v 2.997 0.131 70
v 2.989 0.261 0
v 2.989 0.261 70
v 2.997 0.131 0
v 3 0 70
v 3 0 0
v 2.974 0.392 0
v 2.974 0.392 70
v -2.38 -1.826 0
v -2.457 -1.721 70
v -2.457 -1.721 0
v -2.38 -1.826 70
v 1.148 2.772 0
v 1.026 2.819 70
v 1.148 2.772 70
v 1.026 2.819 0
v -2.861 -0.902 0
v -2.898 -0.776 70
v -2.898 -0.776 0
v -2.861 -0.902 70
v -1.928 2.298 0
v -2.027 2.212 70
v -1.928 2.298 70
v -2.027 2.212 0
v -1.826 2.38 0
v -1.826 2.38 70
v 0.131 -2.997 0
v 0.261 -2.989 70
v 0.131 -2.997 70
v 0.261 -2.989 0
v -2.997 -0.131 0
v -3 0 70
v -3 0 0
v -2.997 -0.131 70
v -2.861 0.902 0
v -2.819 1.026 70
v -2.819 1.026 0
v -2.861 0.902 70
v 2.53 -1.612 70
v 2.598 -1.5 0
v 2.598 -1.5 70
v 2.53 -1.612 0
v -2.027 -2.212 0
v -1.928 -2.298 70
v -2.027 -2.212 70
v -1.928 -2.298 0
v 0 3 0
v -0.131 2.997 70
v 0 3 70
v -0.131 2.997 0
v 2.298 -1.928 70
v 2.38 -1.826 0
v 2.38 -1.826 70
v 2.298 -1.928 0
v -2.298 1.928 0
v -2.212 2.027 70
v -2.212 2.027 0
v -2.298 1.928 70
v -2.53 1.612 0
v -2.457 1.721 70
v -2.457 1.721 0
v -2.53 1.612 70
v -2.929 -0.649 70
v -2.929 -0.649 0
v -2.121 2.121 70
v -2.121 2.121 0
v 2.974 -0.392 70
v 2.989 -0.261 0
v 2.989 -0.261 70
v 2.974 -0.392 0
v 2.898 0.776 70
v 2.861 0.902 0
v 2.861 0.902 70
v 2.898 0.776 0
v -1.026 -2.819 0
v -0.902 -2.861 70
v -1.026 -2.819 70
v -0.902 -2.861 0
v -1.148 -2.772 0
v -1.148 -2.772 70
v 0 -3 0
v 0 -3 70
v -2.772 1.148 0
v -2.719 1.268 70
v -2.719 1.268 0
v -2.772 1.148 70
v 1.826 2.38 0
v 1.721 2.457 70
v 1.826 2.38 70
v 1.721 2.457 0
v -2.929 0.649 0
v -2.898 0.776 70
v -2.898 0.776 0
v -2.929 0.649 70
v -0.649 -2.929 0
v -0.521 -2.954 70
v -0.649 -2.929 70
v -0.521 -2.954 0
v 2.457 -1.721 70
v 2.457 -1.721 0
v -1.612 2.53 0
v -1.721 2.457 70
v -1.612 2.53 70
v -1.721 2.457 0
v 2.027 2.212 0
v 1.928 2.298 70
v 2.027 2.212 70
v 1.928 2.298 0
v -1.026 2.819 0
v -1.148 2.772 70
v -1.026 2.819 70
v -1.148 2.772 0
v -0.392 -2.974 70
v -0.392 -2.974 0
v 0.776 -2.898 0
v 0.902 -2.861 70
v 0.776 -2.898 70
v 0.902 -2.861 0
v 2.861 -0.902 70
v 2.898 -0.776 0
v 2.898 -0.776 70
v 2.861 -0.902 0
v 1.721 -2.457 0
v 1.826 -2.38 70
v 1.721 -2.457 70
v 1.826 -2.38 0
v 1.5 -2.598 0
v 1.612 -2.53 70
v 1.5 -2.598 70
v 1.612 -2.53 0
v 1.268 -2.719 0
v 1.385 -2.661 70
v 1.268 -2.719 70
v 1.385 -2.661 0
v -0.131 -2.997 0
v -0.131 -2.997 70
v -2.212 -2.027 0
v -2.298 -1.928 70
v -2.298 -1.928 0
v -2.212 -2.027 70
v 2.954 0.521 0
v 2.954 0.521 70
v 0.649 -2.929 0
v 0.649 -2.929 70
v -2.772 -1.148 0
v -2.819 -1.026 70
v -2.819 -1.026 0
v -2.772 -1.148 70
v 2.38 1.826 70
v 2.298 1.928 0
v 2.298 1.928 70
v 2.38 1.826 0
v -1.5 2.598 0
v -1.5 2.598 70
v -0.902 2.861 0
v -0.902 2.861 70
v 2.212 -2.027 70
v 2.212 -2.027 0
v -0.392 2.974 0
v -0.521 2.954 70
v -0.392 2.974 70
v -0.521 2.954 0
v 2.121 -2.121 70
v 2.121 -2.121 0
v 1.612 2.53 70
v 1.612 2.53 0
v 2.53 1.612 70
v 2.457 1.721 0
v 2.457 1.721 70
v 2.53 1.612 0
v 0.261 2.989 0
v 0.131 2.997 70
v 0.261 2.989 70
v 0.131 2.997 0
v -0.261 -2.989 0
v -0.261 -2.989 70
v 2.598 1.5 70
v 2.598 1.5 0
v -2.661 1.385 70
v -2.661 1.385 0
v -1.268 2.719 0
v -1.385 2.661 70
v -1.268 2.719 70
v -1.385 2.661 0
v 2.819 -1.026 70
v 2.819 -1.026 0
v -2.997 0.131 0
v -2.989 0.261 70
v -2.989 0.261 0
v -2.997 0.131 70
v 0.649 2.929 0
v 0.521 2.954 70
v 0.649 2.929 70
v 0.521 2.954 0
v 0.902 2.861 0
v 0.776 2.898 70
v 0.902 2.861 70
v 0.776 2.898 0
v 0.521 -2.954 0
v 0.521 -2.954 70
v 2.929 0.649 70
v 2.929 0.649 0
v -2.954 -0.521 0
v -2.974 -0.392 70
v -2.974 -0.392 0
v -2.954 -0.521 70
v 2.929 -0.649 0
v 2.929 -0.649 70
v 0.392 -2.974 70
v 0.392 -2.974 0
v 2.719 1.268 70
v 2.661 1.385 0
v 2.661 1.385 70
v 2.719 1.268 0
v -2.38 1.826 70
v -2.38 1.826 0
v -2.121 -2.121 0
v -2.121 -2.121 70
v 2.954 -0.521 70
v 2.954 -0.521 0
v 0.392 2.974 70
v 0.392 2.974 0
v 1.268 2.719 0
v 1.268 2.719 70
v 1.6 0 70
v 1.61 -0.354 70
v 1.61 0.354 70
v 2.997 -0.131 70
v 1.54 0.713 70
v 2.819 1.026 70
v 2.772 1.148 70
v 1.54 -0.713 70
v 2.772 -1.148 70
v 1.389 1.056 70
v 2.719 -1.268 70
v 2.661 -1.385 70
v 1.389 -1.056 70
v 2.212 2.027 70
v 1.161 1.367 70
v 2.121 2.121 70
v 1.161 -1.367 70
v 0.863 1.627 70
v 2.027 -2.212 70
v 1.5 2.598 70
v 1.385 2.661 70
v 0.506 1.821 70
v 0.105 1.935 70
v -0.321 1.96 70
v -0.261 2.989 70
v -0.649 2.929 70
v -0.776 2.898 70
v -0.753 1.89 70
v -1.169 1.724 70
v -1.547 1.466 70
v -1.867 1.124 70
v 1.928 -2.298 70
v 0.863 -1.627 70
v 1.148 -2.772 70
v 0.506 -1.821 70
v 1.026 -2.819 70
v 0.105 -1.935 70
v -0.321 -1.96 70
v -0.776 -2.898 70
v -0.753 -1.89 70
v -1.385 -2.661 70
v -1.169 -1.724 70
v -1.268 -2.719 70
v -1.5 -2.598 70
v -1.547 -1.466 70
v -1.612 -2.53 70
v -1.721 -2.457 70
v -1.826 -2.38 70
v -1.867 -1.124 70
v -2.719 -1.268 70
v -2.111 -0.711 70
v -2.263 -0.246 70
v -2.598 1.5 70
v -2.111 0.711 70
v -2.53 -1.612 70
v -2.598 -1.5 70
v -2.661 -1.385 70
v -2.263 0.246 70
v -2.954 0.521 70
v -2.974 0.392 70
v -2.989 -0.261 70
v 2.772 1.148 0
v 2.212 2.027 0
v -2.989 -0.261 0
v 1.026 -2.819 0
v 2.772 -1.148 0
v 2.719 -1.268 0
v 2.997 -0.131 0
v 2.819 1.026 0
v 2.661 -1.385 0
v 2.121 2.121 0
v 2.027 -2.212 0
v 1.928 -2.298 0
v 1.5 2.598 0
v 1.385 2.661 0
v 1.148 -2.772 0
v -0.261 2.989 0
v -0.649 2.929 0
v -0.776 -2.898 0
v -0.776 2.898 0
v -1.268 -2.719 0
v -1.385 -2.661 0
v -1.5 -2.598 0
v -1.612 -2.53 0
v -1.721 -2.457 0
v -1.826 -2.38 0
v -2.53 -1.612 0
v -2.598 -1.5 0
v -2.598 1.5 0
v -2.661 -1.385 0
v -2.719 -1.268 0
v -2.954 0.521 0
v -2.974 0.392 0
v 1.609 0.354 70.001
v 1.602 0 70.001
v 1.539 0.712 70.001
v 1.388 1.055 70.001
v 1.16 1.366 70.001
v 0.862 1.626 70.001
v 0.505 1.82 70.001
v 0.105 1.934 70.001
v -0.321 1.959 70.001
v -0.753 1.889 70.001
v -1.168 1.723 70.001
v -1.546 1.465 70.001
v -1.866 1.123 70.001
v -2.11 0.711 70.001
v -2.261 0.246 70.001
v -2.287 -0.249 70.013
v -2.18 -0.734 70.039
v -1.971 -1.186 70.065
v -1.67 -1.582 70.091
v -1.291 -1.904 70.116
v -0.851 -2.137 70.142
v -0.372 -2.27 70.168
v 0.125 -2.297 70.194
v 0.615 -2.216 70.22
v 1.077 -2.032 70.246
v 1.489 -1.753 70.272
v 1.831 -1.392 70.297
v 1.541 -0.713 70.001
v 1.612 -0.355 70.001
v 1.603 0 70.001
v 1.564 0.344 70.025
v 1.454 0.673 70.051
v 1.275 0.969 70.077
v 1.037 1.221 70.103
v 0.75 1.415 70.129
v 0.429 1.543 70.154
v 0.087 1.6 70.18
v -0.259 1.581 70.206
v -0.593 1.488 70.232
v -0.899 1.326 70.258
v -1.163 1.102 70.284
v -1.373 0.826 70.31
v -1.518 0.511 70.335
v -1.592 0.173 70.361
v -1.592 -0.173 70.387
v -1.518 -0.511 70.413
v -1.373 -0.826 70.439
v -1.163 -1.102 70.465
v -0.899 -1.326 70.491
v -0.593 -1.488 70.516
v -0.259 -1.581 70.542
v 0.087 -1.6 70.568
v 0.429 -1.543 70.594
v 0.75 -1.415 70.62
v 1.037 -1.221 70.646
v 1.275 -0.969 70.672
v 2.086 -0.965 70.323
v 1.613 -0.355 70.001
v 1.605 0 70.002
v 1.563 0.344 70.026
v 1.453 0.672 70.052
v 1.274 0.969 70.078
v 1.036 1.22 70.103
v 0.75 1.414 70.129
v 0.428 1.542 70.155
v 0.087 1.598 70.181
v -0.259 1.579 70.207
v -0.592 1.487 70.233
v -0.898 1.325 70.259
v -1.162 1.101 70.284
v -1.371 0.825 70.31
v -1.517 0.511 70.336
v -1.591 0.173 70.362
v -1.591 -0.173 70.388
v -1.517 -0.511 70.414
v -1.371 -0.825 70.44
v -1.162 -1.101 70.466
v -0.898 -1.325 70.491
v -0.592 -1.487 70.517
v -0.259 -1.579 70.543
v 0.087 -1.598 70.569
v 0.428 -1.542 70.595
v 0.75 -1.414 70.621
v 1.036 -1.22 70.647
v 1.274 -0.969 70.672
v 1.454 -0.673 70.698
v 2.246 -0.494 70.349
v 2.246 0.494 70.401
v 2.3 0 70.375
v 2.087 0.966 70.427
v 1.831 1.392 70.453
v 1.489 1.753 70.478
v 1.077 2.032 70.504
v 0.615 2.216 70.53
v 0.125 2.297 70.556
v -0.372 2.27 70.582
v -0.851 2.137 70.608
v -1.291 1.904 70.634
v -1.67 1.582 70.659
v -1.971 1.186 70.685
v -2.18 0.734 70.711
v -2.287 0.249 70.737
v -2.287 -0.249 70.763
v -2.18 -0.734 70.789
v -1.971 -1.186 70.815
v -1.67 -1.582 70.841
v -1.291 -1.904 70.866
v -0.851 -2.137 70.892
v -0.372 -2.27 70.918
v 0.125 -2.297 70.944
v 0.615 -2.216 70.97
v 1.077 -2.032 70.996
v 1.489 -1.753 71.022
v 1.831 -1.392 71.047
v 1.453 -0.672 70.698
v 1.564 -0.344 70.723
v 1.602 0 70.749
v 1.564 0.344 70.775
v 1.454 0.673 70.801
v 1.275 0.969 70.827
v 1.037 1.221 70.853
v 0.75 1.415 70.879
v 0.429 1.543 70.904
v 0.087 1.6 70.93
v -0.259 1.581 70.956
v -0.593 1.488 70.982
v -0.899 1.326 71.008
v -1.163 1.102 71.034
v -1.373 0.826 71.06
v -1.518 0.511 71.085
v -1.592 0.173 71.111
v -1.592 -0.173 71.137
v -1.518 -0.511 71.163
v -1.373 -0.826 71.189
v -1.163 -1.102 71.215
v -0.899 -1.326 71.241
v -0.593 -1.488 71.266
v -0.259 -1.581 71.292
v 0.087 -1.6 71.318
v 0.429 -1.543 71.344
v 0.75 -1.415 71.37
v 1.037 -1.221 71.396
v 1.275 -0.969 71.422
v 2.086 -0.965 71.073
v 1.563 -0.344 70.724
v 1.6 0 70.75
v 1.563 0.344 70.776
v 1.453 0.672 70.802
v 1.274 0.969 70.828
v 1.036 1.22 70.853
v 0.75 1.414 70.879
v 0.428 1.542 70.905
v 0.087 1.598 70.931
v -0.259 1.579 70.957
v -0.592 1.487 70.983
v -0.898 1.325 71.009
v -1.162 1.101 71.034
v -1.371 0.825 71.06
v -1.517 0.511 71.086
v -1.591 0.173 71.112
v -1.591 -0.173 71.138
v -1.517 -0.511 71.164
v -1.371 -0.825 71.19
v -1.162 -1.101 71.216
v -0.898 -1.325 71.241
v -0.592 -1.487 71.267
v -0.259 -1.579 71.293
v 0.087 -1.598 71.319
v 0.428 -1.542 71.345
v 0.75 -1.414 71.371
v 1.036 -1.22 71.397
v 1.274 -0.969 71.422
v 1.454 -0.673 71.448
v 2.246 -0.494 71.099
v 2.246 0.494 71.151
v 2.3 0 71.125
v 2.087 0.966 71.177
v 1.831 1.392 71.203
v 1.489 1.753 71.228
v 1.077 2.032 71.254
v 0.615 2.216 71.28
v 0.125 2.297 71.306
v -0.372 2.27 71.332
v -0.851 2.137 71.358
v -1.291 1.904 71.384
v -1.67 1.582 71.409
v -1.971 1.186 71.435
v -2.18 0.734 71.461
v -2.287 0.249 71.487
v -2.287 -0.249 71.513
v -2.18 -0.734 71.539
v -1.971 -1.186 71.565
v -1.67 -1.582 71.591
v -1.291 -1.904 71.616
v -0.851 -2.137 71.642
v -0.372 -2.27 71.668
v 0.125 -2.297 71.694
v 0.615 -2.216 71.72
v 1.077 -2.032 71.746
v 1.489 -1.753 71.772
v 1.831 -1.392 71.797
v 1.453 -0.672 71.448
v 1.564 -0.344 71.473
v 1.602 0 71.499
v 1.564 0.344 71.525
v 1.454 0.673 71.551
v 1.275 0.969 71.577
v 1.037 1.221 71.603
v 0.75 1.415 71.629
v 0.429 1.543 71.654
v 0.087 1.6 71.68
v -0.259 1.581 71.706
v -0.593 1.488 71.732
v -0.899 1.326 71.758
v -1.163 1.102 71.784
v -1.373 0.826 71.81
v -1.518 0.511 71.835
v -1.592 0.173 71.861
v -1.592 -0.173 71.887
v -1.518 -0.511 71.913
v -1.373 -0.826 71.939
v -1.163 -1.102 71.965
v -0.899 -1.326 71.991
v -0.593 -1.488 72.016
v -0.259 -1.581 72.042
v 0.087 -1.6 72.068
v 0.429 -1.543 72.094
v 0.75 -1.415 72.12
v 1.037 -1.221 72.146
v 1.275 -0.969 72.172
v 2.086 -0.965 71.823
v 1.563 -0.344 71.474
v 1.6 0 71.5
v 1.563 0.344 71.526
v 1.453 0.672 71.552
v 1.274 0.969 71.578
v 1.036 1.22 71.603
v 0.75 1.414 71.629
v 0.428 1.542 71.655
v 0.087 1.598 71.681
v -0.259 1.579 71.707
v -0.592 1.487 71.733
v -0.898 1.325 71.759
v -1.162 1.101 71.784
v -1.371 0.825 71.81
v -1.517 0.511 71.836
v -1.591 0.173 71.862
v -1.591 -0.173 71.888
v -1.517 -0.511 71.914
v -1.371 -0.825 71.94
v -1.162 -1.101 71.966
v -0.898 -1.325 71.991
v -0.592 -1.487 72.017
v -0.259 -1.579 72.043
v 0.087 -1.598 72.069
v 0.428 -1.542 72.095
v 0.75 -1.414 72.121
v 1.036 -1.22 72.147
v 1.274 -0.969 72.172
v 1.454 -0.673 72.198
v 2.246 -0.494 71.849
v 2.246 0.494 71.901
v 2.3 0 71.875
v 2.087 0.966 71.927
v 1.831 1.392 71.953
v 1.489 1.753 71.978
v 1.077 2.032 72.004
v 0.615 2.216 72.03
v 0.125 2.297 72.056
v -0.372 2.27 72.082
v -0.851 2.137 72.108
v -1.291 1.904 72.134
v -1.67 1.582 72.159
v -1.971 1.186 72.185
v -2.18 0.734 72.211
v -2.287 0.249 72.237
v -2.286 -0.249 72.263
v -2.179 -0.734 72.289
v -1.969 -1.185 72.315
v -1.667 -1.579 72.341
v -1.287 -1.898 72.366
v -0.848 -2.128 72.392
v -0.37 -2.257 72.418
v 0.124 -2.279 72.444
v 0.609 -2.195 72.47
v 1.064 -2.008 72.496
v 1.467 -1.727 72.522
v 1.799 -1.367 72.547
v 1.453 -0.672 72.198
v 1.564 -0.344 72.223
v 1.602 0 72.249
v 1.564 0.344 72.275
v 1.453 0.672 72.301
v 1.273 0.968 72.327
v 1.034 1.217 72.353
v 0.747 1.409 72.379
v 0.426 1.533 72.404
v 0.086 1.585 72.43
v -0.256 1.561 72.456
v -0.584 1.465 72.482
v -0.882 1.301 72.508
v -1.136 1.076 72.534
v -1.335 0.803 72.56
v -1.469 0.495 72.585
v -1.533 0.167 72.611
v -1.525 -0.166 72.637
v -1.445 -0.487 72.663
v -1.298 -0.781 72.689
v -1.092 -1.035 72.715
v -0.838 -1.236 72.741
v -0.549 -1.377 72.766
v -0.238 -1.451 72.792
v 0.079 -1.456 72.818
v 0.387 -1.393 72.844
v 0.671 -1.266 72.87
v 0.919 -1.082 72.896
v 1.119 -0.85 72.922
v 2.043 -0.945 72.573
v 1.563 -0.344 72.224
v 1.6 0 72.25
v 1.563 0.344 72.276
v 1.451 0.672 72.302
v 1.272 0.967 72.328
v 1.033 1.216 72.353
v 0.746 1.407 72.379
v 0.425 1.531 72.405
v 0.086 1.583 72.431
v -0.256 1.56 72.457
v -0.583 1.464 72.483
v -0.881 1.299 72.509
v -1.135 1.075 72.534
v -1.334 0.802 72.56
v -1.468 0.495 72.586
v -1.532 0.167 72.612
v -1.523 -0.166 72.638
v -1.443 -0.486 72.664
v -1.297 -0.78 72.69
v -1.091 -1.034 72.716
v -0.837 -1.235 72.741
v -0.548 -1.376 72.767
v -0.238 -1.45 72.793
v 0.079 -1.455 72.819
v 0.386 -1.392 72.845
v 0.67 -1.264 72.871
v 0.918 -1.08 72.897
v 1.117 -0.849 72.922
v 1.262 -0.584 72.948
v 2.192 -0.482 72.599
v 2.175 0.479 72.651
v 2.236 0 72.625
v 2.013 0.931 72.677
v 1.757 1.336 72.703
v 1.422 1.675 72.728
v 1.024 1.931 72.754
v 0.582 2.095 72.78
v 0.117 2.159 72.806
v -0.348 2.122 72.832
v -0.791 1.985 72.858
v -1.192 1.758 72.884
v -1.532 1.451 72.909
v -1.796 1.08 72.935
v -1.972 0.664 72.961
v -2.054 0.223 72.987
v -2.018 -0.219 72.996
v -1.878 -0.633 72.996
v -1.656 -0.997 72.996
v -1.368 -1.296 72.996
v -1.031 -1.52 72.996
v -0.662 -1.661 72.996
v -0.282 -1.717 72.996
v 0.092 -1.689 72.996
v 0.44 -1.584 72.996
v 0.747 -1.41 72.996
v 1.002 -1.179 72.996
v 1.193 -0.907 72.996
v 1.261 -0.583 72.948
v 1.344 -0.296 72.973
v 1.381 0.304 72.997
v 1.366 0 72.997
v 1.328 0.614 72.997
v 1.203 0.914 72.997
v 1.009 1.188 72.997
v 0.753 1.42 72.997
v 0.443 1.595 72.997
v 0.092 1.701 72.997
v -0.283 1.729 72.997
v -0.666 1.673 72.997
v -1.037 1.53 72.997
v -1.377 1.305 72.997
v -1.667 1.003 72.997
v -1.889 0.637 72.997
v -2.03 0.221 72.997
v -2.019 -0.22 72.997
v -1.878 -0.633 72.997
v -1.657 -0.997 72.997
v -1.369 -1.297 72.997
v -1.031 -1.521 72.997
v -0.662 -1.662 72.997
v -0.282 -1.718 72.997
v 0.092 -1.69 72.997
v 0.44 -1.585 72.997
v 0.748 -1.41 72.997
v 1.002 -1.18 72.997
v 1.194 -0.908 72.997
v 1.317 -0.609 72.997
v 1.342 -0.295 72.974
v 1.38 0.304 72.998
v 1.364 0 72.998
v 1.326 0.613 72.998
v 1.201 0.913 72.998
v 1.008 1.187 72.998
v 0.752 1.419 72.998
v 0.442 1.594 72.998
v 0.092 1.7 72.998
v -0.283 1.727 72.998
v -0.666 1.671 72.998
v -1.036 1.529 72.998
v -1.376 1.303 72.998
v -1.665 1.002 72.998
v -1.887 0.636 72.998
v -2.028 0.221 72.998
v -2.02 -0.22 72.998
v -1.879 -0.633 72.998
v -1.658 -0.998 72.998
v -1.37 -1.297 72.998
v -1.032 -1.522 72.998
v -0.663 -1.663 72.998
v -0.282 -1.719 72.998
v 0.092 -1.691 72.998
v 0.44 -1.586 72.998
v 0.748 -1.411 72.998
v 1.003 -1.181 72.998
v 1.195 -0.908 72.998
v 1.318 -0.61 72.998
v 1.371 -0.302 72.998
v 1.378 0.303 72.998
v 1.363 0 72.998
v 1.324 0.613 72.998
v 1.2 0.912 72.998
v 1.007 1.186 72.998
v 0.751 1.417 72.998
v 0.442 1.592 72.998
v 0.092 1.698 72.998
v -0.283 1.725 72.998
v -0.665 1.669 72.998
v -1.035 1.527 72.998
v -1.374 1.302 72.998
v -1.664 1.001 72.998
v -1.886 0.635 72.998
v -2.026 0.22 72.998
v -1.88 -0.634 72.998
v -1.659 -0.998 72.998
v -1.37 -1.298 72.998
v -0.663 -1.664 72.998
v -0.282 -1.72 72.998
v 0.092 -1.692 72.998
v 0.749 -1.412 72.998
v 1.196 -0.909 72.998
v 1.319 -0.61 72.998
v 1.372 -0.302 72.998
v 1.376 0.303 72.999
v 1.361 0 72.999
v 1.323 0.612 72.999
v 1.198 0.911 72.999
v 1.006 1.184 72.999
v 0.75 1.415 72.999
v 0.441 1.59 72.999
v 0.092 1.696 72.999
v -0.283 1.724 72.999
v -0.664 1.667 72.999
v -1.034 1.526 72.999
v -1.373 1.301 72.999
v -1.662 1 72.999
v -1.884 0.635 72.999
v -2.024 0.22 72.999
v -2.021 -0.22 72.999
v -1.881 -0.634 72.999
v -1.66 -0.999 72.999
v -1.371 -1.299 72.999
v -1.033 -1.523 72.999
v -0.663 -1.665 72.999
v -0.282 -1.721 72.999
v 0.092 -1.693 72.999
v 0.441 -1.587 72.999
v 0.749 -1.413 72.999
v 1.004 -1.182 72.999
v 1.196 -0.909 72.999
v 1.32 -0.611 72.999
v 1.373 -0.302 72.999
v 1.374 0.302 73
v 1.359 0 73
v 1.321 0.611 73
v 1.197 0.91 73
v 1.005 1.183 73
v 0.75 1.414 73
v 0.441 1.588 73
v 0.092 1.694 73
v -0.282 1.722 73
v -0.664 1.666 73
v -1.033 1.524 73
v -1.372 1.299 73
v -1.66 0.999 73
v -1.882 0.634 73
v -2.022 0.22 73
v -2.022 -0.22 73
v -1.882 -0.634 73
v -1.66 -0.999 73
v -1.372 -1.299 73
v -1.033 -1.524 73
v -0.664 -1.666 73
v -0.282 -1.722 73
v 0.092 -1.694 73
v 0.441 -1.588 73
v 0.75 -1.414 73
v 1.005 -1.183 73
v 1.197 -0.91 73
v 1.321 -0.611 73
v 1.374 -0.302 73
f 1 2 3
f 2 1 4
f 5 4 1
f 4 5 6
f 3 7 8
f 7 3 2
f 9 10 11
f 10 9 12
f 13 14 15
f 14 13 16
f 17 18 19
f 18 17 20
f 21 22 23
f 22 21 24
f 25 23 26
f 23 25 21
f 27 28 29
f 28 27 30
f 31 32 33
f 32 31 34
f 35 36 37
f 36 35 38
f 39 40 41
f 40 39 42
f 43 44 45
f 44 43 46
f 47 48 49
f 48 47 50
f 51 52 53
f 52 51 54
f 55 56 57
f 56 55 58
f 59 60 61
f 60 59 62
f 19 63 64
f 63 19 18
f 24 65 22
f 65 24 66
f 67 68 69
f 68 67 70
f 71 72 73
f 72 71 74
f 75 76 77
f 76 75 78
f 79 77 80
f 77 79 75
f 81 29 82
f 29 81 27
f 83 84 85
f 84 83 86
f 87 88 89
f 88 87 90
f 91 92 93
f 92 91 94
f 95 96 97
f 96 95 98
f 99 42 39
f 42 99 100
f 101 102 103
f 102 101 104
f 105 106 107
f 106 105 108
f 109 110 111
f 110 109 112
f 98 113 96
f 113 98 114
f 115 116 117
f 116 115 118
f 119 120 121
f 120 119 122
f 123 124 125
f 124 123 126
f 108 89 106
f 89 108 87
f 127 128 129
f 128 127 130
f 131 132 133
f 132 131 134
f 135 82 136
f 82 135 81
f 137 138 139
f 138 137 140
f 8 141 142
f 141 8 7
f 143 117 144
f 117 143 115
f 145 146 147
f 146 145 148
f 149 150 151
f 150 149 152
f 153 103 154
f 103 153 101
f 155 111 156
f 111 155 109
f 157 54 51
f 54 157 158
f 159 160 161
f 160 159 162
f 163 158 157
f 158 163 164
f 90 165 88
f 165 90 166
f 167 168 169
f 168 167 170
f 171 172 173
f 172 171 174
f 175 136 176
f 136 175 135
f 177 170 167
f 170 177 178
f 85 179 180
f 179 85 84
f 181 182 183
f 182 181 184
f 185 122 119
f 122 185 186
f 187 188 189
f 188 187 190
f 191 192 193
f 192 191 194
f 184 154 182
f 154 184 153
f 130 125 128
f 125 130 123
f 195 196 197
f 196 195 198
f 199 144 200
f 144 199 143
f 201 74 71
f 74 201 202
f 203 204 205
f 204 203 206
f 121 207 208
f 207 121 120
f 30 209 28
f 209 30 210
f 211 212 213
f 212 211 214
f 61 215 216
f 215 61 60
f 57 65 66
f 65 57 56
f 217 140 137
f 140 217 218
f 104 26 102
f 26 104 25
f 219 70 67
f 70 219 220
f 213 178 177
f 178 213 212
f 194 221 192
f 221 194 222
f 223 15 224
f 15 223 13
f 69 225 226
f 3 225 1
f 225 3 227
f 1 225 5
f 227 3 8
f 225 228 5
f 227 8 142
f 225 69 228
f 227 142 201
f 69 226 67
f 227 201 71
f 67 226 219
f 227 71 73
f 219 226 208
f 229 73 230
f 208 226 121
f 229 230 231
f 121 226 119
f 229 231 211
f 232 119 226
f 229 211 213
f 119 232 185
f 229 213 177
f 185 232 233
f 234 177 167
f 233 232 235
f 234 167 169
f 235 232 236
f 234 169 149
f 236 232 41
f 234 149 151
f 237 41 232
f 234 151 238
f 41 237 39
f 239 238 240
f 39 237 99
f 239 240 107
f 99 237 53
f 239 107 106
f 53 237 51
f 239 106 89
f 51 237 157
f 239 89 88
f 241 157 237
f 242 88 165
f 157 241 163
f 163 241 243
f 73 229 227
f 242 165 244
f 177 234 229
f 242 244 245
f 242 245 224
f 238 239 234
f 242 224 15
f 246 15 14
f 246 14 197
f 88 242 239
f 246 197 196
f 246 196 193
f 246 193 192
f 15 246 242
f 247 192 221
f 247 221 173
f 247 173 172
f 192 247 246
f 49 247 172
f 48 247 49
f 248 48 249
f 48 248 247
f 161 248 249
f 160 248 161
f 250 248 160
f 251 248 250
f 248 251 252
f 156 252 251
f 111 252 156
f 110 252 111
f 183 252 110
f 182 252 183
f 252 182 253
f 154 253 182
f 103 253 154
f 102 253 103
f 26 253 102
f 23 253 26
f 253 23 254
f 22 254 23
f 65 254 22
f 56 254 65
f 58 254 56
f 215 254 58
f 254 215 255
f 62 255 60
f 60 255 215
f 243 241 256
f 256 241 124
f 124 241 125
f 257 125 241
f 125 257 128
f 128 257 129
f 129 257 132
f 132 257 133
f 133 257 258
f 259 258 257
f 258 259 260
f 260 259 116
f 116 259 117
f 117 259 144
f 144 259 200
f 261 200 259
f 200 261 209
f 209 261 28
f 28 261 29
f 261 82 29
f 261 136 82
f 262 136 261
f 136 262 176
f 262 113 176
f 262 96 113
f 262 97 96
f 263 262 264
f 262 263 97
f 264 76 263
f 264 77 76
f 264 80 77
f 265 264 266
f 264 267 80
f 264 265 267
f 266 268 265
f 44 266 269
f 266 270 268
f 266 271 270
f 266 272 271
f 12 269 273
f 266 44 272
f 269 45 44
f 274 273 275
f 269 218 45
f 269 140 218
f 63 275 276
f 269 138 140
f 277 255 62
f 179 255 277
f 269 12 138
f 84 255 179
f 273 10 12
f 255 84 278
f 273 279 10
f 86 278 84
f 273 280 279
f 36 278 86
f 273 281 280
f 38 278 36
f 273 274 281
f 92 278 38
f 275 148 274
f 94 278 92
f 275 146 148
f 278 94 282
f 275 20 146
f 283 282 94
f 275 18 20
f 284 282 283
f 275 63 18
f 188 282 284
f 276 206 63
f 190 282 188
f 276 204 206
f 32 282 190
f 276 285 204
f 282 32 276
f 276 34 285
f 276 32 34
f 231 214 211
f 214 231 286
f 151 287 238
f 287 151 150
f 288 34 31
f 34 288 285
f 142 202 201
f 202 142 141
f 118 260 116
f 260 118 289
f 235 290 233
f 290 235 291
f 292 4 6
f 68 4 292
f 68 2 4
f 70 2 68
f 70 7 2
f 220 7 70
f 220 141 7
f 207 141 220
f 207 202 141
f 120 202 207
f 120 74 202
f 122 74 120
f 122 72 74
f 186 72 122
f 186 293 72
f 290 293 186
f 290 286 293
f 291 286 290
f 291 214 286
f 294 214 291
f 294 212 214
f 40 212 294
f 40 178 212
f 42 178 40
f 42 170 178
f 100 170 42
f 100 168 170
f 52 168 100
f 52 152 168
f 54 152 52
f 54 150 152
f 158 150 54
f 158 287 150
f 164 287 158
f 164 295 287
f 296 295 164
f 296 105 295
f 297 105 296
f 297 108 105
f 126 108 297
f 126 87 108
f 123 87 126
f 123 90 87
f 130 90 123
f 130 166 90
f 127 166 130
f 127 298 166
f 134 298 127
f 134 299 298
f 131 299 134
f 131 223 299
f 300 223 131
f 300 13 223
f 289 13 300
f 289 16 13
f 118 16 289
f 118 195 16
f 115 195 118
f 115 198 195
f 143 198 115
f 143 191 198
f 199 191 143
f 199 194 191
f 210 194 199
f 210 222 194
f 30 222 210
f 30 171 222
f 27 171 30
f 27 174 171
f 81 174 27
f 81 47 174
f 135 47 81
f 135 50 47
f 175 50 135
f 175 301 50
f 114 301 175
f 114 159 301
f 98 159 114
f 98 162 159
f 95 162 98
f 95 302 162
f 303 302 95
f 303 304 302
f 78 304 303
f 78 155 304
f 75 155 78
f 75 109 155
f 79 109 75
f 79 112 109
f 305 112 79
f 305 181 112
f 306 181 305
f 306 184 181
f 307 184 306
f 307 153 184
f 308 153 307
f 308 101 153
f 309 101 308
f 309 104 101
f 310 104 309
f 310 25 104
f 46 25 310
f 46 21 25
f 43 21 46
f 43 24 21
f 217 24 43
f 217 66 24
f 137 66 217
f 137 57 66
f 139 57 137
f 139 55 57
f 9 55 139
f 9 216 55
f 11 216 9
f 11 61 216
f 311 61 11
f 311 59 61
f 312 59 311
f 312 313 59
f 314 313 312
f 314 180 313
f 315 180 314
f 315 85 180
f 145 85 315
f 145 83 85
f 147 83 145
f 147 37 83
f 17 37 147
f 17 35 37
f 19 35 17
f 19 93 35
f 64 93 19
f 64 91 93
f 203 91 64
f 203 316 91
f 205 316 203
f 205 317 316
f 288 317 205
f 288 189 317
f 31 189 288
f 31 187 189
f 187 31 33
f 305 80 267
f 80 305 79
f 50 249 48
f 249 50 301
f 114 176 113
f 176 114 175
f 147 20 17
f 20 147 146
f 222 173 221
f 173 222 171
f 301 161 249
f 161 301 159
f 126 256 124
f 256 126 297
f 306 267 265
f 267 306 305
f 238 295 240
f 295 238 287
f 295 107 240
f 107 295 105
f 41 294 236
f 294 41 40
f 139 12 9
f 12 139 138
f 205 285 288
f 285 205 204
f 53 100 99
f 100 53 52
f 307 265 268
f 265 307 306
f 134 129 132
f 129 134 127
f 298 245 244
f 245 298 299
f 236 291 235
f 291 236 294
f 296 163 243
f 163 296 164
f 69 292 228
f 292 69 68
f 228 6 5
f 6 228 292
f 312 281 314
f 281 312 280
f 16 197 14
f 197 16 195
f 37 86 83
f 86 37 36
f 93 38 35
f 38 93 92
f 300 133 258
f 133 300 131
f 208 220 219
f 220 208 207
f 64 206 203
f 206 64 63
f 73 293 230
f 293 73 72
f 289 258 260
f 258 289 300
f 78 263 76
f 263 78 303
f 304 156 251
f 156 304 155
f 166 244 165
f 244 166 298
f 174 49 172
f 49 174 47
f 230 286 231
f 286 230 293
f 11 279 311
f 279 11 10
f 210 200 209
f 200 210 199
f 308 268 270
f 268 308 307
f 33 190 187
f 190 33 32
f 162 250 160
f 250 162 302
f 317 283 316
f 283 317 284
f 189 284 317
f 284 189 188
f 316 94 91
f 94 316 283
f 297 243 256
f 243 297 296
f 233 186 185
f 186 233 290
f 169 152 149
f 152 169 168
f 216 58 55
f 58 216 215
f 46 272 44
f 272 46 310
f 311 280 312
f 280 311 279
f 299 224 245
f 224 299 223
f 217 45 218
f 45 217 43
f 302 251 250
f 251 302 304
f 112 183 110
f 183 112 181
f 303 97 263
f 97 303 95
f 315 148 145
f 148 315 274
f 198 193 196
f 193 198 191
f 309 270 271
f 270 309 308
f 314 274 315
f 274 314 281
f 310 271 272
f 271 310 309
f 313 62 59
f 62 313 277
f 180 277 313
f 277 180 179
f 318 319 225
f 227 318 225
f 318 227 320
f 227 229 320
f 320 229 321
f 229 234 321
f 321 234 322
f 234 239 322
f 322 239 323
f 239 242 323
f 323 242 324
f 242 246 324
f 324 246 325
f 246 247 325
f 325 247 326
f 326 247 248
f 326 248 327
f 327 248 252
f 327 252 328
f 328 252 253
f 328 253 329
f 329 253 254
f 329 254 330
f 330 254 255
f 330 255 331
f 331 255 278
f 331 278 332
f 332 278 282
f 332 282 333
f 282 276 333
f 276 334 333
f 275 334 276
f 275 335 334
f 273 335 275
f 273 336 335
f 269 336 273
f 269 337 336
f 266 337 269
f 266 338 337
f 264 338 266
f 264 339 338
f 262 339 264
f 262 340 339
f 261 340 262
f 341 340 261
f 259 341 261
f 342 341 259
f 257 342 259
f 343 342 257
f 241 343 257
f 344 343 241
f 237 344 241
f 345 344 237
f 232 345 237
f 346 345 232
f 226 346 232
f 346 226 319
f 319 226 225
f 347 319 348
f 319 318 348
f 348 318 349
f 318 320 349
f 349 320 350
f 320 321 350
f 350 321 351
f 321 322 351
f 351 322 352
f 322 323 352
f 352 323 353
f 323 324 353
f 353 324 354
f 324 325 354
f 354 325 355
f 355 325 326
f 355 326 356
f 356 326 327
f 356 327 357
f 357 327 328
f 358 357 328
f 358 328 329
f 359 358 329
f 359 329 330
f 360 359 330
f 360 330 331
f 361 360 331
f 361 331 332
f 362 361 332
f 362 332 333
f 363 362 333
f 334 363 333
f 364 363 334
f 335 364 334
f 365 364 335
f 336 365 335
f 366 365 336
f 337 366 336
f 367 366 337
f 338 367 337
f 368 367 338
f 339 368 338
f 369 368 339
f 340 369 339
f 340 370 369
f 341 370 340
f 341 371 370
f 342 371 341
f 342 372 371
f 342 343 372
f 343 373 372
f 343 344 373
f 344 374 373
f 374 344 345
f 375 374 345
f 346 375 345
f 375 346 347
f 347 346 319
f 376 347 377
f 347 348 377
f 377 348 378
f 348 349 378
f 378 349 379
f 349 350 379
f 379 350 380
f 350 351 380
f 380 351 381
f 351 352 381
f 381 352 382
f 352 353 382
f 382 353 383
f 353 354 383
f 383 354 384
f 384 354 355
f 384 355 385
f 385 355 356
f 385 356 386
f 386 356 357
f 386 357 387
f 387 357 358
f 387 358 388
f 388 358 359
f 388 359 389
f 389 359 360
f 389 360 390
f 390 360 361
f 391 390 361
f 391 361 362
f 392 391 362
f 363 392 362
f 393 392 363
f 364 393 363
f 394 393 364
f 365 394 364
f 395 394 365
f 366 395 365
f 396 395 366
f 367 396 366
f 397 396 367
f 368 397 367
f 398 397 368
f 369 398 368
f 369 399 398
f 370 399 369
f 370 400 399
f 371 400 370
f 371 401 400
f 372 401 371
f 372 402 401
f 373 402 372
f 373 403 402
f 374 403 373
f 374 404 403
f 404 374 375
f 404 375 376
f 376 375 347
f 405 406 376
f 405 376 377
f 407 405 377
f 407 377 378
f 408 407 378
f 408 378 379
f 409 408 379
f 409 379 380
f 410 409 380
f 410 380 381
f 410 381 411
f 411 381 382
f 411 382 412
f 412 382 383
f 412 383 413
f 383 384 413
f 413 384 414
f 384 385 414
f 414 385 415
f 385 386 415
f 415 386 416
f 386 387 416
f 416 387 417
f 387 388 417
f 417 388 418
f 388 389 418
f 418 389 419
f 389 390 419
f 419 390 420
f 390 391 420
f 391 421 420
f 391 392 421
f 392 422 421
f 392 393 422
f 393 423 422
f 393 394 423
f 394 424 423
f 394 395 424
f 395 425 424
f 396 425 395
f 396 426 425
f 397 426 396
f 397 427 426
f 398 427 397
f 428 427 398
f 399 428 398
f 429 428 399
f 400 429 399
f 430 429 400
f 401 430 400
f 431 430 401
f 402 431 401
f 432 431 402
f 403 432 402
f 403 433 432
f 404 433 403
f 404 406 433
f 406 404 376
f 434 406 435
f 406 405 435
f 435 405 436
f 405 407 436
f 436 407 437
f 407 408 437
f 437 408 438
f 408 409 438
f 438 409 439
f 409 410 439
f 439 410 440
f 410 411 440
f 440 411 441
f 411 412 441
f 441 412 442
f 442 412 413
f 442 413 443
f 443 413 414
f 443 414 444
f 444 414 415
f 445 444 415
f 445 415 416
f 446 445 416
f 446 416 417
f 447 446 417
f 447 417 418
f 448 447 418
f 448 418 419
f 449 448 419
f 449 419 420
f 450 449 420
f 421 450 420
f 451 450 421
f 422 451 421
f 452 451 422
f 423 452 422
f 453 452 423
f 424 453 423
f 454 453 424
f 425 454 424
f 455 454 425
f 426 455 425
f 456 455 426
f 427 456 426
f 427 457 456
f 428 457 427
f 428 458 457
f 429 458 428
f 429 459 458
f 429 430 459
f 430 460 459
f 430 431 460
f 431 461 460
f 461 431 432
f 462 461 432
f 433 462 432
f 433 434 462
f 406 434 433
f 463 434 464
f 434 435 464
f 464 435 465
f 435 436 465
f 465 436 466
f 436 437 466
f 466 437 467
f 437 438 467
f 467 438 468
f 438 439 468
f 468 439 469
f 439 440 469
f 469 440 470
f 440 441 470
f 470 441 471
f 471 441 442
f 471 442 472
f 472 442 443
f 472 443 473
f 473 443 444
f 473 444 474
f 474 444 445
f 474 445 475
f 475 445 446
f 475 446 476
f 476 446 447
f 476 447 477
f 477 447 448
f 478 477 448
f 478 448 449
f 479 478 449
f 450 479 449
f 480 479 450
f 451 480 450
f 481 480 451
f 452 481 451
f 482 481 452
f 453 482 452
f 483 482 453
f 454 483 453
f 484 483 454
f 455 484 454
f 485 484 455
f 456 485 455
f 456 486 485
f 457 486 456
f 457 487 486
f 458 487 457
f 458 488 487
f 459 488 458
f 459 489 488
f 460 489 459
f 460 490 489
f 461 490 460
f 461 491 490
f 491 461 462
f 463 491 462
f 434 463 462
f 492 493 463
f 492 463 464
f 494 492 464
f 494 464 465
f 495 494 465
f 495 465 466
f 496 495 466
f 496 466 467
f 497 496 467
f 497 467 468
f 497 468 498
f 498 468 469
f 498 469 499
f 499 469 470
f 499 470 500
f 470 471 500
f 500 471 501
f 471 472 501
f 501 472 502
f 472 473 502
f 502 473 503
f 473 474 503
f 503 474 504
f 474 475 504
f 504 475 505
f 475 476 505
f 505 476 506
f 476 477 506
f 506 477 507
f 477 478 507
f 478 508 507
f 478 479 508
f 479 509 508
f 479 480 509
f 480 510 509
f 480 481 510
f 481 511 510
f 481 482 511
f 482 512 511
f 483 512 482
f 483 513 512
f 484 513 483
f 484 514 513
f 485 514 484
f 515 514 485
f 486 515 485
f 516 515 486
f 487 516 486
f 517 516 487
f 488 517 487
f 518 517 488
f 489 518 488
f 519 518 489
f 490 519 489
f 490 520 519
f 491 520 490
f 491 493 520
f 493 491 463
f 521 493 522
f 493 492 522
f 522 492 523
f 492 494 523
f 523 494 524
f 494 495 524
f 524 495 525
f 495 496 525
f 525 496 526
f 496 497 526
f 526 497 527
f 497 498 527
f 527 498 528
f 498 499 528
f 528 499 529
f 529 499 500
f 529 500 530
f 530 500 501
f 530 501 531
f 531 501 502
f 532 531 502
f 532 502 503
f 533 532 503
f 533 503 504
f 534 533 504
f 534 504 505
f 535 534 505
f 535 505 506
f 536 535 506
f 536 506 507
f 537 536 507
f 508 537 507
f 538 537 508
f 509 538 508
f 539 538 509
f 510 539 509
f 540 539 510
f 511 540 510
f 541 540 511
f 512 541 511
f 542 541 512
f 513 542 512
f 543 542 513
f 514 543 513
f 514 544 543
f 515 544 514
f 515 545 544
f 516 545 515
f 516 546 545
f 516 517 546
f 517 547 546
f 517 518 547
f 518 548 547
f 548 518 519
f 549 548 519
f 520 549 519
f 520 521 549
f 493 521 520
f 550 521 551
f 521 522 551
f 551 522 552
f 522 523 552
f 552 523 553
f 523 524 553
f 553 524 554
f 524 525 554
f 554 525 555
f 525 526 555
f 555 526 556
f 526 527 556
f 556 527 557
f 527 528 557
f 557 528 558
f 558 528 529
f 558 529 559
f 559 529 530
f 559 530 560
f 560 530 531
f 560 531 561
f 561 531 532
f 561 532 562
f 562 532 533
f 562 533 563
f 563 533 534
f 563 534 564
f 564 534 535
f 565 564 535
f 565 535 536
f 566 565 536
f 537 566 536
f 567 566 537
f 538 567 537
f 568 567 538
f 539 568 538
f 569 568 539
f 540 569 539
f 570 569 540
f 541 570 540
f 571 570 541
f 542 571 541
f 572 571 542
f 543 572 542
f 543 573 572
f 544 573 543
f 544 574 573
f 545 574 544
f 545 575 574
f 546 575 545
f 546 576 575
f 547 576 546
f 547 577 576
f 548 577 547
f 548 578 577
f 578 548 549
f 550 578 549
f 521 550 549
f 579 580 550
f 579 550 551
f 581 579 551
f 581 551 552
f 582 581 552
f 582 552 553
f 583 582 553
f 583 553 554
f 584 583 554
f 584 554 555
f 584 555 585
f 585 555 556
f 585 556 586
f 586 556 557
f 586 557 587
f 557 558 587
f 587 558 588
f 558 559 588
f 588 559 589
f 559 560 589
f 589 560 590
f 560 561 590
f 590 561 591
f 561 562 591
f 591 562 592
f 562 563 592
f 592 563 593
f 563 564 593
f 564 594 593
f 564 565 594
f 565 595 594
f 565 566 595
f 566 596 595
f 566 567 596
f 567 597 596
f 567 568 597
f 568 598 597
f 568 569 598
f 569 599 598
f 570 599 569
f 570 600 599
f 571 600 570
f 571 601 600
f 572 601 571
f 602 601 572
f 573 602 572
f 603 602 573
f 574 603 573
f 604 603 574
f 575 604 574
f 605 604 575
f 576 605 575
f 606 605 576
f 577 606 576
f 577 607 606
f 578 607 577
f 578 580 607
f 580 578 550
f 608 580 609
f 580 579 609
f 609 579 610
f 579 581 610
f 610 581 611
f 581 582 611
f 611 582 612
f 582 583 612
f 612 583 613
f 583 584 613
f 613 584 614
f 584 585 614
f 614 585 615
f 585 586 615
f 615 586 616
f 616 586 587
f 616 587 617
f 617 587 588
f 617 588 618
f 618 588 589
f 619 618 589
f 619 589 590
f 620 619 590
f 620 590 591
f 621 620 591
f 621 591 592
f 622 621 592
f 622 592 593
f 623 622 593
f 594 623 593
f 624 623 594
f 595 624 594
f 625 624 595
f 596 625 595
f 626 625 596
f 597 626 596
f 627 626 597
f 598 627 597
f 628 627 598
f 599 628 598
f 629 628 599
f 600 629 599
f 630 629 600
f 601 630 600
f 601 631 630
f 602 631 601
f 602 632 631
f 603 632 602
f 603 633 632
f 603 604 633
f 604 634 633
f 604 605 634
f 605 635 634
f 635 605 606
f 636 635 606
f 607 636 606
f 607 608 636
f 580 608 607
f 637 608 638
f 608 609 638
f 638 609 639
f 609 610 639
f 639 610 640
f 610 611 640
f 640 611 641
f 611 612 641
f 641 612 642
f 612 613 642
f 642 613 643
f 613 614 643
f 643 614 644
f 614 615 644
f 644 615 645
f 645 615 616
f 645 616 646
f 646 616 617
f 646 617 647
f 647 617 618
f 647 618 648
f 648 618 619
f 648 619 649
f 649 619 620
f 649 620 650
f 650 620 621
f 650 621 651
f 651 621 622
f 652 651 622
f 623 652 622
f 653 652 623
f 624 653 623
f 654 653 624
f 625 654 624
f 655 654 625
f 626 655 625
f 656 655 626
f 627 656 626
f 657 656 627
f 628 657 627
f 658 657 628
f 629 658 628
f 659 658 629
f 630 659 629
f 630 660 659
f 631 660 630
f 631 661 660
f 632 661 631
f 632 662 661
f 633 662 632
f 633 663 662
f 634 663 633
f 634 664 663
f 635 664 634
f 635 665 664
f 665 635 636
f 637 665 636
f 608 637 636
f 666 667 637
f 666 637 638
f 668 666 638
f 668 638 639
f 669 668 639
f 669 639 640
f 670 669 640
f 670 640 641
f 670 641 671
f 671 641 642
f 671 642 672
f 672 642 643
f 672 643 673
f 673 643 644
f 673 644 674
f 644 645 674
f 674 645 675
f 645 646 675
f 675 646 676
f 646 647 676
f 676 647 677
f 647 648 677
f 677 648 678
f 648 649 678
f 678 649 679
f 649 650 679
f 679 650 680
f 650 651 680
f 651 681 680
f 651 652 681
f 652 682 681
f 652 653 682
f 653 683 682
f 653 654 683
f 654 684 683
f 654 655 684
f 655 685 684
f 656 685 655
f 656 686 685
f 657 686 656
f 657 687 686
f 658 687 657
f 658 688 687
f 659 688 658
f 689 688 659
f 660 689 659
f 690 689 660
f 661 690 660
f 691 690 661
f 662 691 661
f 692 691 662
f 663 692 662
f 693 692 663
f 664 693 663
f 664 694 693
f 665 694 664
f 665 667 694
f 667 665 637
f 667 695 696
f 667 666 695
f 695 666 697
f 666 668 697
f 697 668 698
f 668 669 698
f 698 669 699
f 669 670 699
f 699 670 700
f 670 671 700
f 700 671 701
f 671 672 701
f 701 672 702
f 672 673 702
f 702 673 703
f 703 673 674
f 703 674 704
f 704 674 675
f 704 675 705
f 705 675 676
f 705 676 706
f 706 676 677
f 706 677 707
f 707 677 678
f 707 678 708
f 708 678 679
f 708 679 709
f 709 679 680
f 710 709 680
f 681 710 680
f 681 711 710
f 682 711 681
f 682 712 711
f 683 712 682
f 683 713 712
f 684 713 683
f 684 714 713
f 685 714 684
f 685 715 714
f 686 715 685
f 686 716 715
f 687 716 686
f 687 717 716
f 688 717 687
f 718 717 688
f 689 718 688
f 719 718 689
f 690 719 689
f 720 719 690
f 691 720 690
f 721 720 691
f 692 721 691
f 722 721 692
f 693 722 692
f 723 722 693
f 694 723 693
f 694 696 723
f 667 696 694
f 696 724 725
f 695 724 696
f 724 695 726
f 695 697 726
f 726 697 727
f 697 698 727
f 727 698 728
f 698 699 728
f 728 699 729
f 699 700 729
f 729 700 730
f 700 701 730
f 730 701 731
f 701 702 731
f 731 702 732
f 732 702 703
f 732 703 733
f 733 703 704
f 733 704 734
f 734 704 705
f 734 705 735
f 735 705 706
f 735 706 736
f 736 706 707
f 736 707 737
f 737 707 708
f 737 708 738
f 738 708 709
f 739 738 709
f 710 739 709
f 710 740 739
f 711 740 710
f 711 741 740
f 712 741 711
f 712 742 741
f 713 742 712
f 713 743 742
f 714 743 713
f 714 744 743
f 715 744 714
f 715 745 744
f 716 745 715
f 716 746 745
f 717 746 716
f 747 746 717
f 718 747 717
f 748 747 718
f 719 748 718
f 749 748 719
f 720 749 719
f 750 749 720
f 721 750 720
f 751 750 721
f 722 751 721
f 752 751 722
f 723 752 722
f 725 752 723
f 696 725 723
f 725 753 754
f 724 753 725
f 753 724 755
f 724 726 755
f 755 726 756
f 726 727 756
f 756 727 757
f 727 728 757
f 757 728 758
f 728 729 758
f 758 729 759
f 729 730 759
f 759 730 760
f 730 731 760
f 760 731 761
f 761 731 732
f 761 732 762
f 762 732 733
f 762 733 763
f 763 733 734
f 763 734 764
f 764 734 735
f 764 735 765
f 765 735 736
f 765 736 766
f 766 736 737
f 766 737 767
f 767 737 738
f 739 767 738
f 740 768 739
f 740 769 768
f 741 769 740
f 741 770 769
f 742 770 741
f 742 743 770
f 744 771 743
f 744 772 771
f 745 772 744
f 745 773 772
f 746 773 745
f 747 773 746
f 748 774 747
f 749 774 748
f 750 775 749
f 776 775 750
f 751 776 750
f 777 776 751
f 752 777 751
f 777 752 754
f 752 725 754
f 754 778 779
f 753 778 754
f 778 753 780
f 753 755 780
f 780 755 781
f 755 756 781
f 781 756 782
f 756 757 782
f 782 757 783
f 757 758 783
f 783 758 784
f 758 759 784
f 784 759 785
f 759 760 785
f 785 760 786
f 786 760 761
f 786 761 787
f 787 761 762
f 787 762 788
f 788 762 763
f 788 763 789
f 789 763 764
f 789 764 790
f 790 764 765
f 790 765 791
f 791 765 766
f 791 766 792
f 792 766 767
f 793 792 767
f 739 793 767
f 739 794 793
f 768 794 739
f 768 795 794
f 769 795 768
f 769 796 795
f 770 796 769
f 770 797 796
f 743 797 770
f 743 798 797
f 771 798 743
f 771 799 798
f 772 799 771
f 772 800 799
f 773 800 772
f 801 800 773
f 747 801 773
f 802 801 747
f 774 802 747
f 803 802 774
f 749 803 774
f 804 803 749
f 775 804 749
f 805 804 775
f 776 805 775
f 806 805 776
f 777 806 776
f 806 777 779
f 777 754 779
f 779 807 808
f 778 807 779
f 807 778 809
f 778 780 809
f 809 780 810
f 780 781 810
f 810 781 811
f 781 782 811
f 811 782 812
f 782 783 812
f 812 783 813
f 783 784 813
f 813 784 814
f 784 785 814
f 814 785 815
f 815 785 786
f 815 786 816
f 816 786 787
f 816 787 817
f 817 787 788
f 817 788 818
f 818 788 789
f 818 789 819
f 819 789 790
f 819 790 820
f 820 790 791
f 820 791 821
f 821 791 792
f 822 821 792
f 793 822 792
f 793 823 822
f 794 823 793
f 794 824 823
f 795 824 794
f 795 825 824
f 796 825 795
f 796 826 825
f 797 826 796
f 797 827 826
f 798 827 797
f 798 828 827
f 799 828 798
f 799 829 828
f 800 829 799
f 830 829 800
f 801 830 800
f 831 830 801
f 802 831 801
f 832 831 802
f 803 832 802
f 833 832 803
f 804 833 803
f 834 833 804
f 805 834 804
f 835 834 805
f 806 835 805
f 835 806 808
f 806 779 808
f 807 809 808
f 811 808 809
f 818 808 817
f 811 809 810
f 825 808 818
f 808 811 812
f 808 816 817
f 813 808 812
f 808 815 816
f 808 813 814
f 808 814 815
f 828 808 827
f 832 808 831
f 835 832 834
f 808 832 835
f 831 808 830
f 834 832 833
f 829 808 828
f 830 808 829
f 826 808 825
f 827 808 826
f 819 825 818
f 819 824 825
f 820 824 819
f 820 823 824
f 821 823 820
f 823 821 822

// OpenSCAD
// Created 2016-2017 by Ryan A. Colyer.
// This work is released with CC0 into the public domain.
// https://creativecommons.org/publicdomain/zero/1.0/
//
// https://www.thingiverse.com/thing:1686322
//
// v2.1

$fn = 100;

screw_resolution = 0.5;  // in mm

// Legs
leg_diameter = 6;
leg_height = 70;

// Provides standard metric thread pitches.
function ThreadPitch(diameter) =
  (diameter <= 64) ?
    lookup(diameter, [
      [2, 0.4],
      [2.5, 0.45],
      [3, 0.5],
      [4, 0.7],
      [5, 0.8],
      [6, 1.0],
      [7, 1.0],
      [8, 1.25],
      [10, 1.5],
      [12, 1.75],
      [14, 2.0],
      [16, 2.0],
      [18, 2.5],
      [20, 2.5],
      [22, 2.5],
      [24, 3.0],
      [27, 3.0],
      [30, 3.5],
      [33, 3.5],
      [36, 4.0],
      [39, 4.0],
      [42, 4.5],
      [48, 5.0],
      [52, 5.0],
      [56, 5.5],
      [60, 5.5],
      [64, 6.0]
    ]) :
    diameter * 6.0 / 64;


// This generates a closed polyhedron from an array of arrays of points,
// with each inner array tracing out one loop outlining the polyhedron.
// pointarrays should contain an array of N arrays each of size P outlining a
// closed manifold.  The points must obey the right-hand rule.  For example,
// looking down, the P points in the inner arrays are counter-clockwise in a
// loop, while the N point arrays increase in height.  Points in each inner
// array do not need to be equal height, but they usually should not meet or
// cross the line segments from the adjacent points in the other arrays.
// (N>=2, P>=3)
// Core triangles:
//   [j][i], [j+1][i], [j+1][(i+1)%P]
//   [j][i], [j+1][(i+1)%P], [j][(i+1)%P]
//   Then triangles are formed in a loop with the middle point of the first
//   and last array.
module ClosePoints(pointarrays) {
  function recurse_avg(arr, n=0, p=[0,0,0]) = (n>=len(arr)) ? p :
    recurse_avg(arr, n+1, p+(arr[n]-p)/(n+1));

  N = len(pointarrays);
  P = len(pointarrays[0]);
  NP = N*P;
  lastarr = pointarrays[N-1];
  midbot = recurse_avg(pointarrays[0]);
  midtop = recurse_avg(pointarrays[N-1]);

  faces_bot = [
    for (i=[0:P-1])
      [0,i+1,1+(i+1)%len(pointarrays[0])]
  ];

  loop_offset = 1;
  bot_len = loop_offset + P;

  faces_loop = [
    for (j=[0:N-2], i=[0:P-1], t=[0:1])
      [loop_offset, loop_offset, loop_offset] + (t==0 ?
      [j*P+i, (j+1)*P+i, (j+1)*P+(i+1)%P] :
      [j*P+i, (j+1)*P+(i+1)%P, j*P+(i+1)%P])
  ];

  top_offset = loop_offset + NP - P;
  midtop_offset = top_offset + P;

  faces_top = [
    for (i=[0:P-1])
      [midtop_offset,top_offset+(i+1)%P,top_offset+i]
  ];

  points = [
    for (i=[-1:NP])
      (i<0) ? midbot :
      ((i==NP) ? midtop :
      pointarrays[floor(i/P)][i%P])
  ];
  faces = concat(faces_bot, faces_loop, faces_top);

  polyhedron(points=points, faces=faces);
}

// This creates a vertical rod at the origin with external threads.  It uses
// metric standards by default.
module ScrewThread(outer_diam, height, pitch=0, tooth_angle=30, tolerance=0.4, tip_height=0, tooth_height=0, tip_min_fract=0) {

  pitch = (pitch==0) ? ThreadPitch(outer_diam) : pitch;
  tooth_height = (tooth_height==0) ? pitch : tooth_height;
  tip_min_fract = (tip_min_fract<0) ? 0 :
    ((tip_min_fract>0.9999) ? 0.9999 : tip_min_fract);

  outer_diam_cor = outer_diam + 0.25*tolerance; // Plastic shrinkage correction
  inner_diam = outer_diam - tooth_height/tan(tooth_angle);
  or = (outer_diam_cor < screw_resolution) ?
    screw_resolution/2 : outer_diam_cor / 2;
  ir = (inner_diam < screw_resolution) ? screw_resolution/2 : inner_diam / 2;
  height = (height < screw_resolution) ? screw_resolution : height;

  steps_per_loop_try = ceil(2*3.14159265359*or / screw_resolution);
  steps_per_loop = (steps_per_loop_try < 4) ? 4 : steps_per_loop_try;
  hs_ext = 3;
  hsteps = ceil(3 * height / pitch) + 2*hs_ext;

  extent = or - ir;

  tip_start = height-tip_height;
  tip_height_sc = tip_height / (1-tip_min_fract);

  tip_height_ir = (tip_height_sc > tooth_height/2) ?
    tip_height_sc - tooth_height/2 : tip_height_sc;

  tip_height_w = (tip_height_sc > tooth_height) ? tooth_height : tip_height_sc;
  tip_wstart = height + tip_height_sc - tip_height - tip_height_w;


  function tooth_width(a, h, pitch, tooth_height, extent) =
    let(
      ang_full = h*360.0/pitch-a,
      ang_pn = atan2(sin(ang_full), cos(ang_full)),
      ang = ang_pn < 0 ? ang_pn+360 : ang_pn,
      frac = ang/360,
      tfrac_half = tooth_height / (2*pitch),
      tfrac_cut = 2*tfrac_half
    )
    (frac > tfrac_cut) ? 0 : (
      (frac <= tfrac_half) ?
        ((frac / tfrac_half) * extent) :
        ((1 - (frac - tfrac_half)/tfrac_half) * extent)
    );


  pointarrays = [
    for (hs=[0:hsteps])
      [
        for (s=[0:steps_per_loop-1])
          let(
            ang_full = s*360.0/steps_per_loop,
            ang_pn = atan2(sin(ang_full), cos(ang_full)),
            ang = ang_pn < 0 ? ang_pn+360 : ang_pn,

            h_fudge = pitch*0.001,

            h_mod =
              (hs%3 == 2) ?
                ((s == steps_per_loop-1) ? tooth_height - h_fudge : (
                 (s == steps_per_loop-2) ? tooth_height/2 : 0)) : (
              (hs%3 == 0) ?
                ((s == steps_per_loop-1) ? pitch-tooth_height/2 : (
                 (s == steps_per_loop-2) ? pitch-tooth_height + h_fudge : 0)) :
                ((s == steps_per_loop-1) ? pitch-tooth_height/2 + h_fudge : (
                 (s == steps_per_loop-2) ? tooth_height/2 : 0))
              ),

            h_level =
              (hs%3 == 2) ? tooth_height - h_fudge : (
              (hs%3 == 0) ? 0 : tooth_height/2),

            h_ub = floor((hs-hs_ext)/3) * pitch
              + h_level + ang*pitch/360.0 - h_mod,
            h_max = height - (hsteps-hs) * h_fudge,
            h_min = hs * h_fudge,
            h = (h_ub < h_min) ? h_min : ((h_ub > h_max) ? h_max : h_ub),

            ht = h - tip_start,
            hf_ir = ht/tip_height_ir,
            ht_w = h - tip_wstart,
            hf_w_t = ht_w/tip_height_w,
            hf_w = (hf_w_t < 0) ? 0 : ((hf_w_t > 1) ? 1 : hf_w_t),

            ext_tip = (h <= tip_wstart) ? extent : (1-hf_w) * extent,
            wnormal = tooth_width(ang, h, pitch, tooth_height, ext_tip),
            w = (h <= tip_wstart) ? wnormal :
              (1-hf_w) * wnormal +
              hf_w * (0.1*screw_resolution + (wnormal * wnormal * wnormal /
                (ext_tip*ext_tip+0.1*screw_resolution))),
            r = (ht <= 0) ? ir + w :
              ( (ht < tip_height_ir ? ((2/(1+(hf_ir*hf_ir))-1) * ir) : 0) + w)
          )
          [r*cos(ang), r*sin(ang), h]
      ]
  ];


  ClosePoints(pointarrays);
}

// Solid rod on the bottom, external threads on the top.
module RodStart(height, diameter, thread_len=0, thread_diam=0, thread_pitch=0) {
  // A reasonable default.
  thread_diam = (thread_diam==0) ? 0.75*diameter : thread_diam;
  thread_len = (thread_len==0) ? 0.5*diameter : thread_len;
  thread_pitch = (thread_pitch==0) ? ThreadPitch(thread_diam) : thread_pitch;

  cylinder(r=diameter/2, h=height, $fn=24*diameter);

  translate([0, 0, height])
    ScrewThread(thread_diam, thread_len, thread_pitch,
      tip_height=thread_pitch, tip_min_fract=0.75);
}

// Legs
module leg() {
  RodStart(leg_height, leg_diameter);
}

// Render
leg();
